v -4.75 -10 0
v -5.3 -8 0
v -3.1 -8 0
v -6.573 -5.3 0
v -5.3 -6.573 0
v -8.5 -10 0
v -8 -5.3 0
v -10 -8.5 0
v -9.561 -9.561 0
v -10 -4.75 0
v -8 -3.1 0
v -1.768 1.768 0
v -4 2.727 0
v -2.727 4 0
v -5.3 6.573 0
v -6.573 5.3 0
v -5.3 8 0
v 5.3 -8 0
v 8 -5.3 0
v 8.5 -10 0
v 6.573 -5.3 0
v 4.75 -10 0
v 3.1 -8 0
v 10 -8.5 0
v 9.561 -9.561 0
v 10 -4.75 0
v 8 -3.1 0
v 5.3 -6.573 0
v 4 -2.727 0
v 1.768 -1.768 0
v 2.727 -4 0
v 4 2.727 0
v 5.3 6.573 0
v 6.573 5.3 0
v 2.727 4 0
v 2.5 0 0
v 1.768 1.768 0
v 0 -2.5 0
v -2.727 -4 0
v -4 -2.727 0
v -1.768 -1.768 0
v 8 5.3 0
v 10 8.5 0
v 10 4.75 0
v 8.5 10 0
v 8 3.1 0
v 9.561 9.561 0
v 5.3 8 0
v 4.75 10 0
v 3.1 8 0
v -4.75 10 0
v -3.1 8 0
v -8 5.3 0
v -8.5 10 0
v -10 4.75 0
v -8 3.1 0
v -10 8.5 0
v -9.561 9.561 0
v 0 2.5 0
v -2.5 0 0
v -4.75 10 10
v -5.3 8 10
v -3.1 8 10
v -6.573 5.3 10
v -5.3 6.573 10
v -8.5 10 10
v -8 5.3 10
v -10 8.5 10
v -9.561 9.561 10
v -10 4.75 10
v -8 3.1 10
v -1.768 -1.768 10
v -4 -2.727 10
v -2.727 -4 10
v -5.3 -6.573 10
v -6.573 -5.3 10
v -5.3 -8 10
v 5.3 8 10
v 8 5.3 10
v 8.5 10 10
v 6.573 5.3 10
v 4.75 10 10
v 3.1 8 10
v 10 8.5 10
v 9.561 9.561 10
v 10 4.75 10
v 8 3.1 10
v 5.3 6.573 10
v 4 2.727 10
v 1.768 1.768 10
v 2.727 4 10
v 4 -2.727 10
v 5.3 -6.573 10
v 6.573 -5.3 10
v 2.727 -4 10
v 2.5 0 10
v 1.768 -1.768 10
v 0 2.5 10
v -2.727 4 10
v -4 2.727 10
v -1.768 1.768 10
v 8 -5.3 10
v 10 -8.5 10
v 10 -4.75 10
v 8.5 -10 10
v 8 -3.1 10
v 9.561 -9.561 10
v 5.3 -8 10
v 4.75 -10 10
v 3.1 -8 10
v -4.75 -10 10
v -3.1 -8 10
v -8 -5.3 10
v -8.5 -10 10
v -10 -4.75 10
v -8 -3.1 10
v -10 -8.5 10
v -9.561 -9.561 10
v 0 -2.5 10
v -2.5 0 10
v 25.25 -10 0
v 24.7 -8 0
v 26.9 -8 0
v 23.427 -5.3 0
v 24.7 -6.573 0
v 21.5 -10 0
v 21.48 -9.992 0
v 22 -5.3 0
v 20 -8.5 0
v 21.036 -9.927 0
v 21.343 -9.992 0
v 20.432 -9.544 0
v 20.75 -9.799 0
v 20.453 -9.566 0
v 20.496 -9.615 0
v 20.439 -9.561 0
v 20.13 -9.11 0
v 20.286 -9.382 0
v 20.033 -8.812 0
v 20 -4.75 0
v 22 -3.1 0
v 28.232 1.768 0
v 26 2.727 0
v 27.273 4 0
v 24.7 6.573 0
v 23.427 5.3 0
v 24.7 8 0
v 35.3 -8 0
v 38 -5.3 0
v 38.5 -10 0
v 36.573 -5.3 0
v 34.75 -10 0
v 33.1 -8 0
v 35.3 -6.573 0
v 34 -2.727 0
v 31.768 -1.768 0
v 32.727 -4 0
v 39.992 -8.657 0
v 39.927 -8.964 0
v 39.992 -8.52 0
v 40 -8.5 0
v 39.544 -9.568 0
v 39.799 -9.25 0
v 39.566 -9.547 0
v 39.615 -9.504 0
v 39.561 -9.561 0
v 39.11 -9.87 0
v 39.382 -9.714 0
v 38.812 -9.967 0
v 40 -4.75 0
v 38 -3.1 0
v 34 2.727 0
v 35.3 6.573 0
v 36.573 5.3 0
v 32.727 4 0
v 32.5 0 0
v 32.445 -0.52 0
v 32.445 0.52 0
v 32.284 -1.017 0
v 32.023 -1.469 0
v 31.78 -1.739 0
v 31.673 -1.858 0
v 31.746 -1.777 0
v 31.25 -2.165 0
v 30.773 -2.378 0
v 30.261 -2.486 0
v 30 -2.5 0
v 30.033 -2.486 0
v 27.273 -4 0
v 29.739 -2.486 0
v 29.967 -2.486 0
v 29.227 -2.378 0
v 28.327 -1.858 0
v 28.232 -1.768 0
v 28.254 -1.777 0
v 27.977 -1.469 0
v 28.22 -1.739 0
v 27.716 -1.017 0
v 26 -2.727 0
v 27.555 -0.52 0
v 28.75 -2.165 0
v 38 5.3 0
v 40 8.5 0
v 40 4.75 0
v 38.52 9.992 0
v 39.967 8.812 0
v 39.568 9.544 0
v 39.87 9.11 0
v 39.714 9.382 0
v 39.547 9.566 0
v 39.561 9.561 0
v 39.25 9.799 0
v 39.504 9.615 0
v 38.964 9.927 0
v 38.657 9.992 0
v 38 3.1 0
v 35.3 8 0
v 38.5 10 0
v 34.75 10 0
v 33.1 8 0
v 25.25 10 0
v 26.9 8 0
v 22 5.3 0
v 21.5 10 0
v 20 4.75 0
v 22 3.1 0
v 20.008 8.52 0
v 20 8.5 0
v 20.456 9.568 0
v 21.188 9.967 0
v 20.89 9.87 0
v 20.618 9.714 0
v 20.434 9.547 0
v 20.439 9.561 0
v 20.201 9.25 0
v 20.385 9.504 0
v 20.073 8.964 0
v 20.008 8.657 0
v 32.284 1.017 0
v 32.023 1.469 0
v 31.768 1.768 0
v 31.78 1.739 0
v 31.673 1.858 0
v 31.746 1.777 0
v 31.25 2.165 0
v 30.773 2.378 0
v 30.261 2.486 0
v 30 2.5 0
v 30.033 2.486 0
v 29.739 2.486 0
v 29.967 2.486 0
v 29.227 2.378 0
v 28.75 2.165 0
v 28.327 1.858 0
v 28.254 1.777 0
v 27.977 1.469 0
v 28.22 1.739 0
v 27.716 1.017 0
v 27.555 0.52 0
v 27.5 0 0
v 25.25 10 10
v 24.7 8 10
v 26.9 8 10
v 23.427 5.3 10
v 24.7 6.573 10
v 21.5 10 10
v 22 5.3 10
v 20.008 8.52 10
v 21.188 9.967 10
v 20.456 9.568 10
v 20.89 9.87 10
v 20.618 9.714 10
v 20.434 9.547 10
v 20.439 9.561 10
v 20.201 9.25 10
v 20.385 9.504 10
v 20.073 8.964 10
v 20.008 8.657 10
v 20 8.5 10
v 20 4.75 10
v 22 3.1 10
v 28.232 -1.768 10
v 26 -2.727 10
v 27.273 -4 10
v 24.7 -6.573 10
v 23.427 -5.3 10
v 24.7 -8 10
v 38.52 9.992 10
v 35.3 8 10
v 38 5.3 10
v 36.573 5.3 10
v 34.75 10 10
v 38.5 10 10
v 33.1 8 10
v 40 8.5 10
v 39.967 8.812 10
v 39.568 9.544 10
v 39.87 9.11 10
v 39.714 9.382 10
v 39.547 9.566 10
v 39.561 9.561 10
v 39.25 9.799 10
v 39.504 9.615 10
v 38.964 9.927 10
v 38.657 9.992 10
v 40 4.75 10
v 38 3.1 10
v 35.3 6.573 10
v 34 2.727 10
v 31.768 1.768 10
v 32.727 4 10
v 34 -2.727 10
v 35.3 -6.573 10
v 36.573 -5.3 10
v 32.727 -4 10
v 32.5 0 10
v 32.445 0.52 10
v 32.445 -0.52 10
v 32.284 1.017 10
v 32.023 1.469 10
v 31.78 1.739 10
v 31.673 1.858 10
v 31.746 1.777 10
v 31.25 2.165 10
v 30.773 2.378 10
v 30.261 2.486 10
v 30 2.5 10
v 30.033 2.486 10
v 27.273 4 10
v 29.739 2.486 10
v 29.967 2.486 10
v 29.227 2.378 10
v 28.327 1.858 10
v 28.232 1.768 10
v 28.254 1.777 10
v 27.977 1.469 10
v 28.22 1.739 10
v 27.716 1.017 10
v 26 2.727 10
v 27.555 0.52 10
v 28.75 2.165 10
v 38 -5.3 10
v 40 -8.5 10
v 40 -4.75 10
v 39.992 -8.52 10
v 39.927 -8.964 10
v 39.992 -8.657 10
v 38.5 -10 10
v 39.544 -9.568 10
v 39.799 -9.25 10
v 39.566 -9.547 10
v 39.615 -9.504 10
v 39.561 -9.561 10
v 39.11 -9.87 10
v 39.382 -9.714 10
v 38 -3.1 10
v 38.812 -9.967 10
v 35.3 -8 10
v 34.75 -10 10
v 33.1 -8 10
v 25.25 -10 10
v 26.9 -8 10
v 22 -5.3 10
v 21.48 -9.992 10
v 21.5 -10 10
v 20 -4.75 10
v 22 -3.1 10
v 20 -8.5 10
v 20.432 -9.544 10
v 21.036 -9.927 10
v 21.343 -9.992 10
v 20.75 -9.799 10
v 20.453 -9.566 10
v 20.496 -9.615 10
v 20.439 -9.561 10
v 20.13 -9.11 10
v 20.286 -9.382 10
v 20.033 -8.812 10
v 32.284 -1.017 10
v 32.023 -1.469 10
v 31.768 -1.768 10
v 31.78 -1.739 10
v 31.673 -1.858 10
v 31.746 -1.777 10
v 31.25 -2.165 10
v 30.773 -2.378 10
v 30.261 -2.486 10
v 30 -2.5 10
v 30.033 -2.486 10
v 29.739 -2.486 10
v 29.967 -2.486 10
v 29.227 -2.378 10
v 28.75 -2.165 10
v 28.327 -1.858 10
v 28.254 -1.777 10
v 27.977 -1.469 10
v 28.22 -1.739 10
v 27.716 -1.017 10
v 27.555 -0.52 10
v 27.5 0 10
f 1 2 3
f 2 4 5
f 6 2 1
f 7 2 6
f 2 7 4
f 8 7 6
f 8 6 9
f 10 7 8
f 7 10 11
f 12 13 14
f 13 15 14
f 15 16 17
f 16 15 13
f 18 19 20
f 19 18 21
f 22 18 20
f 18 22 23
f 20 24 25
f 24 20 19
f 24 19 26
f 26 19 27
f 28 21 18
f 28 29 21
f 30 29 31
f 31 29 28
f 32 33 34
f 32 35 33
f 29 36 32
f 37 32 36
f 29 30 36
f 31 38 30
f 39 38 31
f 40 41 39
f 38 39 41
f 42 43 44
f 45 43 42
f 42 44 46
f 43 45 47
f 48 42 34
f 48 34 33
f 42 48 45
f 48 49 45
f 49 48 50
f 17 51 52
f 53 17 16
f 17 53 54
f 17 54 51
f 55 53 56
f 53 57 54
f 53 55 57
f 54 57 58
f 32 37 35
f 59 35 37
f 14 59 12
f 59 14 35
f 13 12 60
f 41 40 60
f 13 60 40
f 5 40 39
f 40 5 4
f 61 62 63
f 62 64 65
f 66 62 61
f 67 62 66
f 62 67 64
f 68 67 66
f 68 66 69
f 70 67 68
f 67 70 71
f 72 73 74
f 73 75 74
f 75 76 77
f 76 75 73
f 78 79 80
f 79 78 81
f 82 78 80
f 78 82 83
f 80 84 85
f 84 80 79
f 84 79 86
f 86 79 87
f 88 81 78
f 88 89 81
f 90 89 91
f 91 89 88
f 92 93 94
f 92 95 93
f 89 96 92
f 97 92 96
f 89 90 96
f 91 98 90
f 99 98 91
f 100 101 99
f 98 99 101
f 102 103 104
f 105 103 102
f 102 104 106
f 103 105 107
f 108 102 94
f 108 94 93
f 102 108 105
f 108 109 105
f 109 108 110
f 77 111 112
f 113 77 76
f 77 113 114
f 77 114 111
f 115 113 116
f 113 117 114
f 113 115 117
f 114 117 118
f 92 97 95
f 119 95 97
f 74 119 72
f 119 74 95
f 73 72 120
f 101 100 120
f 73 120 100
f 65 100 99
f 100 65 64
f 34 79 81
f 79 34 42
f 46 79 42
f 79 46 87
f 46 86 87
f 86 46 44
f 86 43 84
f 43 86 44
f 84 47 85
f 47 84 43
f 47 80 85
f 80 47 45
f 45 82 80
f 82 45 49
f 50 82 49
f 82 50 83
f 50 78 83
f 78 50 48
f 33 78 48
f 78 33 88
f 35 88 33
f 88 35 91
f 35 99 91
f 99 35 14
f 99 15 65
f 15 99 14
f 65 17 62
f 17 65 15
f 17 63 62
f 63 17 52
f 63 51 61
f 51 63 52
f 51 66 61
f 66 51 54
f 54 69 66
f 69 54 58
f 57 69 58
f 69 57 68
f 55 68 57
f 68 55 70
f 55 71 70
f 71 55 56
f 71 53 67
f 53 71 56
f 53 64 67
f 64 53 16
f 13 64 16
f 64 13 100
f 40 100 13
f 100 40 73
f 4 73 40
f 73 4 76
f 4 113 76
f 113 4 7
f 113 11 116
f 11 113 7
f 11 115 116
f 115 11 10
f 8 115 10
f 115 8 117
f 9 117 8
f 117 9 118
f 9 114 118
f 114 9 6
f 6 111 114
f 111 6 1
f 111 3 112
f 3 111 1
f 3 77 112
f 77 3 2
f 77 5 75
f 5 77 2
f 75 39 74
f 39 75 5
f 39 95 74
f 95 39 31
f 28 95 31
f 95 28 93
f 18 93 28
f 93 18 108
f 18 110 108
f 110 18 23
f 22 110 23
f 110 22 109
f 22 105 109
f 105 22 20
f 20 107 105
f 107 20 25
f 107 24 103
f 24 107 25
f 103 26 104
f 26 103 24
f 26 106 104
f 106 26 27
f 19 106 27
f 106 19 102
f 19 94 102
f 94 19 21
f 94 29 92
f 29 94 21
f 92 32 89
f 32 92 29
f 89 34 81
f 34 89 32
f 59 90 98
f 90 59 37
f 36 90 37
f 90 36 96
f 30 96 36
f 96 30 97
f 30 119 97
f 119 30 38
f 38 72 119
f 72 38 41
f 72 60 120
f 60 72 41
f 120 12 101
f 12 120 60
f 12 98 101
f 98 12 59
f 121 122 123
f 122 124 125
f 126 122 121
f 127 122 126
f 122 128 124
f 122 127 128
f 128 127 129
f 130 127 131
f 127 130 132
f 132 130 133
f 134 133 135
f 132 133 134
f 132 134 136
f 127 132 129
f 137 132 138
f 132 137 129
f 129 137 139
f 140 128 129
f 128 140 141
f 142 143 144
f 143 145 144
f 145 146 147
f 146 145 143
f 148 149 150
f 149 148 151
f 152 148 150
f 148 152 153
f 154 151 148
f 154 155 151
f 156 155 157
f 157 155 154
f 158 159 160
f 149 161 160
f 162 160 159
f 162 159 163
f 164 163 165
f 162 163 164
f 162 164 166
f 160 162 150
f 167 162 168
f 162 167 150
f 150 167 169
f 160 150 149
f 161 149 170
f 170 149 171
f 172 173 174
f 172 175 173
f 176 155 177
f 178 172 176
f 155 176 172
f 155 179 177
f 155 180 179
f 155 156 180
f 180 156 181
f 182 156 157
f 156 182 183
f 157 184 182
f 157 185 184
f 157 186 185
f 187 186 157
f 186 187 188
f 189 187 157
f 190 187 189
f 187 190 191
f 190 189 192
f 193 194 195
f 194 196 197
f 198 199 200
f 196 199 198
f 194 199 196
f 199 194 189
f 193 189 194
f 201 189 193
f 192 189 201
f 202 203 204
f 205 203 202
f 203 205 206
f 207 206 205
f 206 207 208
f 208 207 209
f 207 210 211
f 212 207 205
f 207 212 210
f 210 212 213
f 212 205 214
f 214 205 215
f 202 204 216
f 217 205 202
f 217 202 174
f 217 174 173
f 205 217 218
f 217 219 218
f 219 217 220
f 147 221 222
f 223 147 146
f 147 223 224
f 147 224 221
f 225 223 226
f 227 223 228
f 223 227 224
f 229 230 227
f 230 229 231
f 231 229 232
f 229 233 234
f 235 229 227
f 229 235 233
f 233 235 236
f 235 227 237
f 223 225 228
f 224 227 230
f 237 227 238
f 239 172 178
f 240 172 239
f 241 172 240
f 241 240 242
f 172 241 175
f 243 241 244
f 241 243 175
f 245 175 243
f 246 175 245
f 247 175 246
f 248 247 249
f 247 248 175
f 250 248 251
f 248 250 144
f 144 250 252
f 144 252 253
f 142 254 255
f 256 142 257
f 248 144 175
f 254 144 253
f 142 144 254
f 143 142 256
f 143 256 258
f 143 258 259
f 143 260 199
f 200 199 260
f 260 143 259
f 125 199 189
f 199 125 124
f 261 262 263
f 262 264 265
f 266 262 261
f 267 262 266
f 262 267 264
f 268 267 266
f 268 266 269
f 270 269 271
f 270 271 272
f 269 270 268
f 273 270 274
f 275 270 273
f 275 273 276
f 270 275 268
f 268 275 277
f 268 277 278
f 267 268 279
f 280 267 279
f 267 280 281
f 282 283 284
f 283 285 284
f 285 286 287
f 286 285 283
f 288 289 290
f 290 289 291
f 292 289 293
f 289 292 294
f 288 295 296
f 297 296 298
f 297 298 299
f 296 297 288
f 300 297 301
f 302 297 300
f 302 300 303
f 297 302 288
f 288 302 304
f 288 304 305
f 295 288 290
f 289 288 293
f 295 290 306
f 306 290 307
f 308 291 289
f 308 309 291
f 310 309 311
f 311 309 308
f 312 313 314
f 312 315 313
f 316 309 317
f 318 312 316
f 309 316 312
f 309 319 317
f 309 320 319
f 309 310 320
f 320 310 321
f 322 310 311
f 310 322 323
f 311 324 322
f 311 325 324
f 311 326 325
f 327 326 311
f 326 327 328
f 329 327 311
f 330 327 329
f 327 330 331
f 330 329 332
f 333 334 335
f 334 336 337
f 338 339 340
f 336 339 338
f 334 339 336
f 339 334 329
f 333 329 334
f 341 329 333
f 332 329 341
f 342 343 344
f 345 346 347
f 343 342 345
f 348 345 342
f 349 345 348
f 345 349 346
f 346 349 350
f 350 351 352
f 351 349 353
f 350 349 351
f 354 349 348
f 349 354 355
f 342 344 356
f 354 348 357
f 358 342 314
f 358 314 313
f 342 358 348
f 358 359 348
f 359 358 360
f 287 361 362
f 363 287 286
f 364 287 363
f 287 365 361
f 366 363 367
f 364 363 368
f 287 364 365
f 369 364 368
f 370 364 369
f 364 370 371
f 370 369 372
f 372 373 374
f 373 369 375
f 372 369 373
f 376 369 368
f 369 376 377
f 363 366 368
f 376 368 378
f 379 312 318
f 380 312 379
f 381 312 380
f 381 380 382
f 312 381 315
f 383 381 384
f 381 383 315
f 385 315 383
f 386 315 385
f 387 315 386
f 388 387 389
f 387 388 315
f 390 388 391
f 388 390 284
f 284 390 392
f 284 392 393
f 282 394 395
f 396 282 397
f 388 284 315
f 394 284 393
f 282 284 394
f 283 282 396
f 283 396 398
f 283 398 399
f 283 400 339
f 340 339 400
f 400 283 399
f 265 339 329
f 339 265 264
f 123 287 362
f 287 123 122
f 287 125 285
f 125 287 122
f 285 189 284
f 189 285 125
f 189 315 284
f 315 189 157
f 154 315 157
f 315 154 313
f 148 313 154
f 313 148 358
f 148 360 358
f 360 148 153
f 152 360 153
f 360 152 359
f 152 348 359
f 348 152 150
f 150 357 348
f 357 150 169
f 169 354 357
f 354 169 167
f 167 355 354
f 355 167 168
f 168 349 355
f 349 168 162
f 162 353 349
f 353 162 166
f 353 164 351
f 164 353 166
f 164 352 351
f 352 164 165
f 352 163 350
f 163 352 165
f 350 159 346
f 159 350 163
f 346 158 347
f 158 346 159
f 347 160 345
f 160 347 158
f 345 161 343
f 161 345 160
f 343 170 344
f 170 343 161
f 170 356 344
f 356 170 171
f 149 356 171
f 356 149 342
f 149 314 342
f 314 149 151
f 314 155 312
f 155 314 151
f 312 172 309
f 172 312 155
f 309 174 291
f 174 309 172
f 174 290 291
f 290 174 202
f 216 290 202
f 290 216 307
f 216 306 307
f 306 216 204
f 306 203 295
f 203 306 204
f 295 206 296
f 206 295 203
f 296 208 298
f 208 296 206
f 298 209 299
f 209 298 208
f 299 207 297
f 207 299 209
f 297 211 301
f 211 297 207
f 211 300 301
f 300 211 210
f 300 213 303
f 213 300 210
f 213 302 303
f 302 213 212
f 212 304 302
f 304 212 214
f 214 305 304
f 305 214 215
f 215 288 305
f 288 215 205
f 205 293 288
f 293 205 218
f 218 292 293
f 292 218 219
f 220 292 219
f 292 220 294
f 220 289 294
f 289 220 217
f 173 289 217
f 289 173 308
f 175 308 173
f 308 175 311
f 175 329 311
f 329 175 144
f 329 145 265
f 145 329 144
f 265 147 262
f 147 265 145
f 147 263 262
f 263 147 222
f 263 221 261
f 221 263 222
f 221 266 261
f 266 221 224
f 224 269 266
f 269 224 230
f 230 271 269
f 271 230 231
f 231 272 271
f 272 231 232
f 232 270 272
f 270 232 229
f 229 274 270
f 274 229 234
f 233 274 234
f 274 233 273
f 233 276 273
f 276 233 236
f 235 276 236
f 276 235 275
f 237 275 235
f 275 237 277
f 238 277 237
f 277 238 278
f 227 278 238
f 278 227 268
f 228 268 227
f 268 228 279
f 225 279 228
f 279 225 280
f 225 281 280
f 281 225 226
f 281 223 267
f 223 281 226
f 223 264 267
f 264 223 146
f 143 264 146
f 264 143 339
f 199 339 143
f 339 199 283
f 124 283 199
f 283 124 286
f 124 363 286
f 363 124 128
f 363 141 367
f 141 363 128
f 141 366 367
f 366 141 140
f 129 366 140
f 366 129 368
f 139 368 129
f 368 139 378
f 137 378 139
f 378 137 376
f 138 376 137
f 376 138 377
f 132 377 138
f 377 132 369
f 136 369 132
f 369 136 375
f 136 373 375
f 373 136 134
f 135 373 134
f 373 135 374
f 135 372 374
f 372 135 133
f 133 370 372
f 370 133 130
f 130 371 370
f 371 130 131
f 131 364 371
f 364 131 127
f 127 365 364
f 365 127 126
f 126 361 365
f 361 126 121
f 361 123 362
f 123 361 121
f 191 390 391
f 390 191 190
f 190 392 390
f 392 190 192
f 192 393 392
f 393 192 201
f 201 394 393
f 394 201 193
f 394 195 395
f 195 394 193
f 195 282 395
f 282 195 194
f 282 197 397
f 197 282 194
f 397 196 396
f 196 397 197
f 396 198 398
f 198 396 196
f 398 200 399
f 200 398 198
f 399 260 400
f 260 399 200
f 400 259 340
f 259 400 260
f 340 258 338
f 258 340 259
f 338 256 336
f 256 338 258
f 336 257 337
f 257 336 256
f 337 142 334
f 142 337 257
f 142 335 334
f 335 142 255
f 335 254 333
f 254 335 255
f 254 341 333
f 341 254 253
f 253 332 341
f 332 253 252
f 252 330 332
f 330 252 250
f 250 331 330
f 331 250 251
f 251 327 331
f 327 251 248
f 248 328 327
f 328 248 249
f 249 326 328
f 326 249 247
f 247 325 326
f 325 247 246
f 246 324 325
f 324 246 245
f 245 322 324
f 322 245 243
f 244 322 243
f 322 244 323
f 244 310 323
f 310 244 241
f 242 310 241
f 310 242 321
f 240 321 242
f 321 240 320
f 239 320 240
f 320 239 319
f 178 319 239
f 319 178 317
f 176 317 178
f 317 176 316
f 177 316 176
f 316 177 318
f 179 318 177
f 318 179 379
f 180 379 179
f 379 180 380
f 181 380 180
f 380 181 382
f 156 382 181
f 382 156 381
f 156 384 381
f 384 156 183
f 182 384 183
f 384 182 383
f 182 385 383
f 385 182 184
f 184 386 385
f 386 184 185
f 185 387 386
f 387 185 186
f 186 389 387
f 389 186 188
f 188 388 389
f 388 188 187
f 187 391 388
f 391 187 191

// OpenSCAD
// Aleksandr Saechnikov 17 june 2015

extrusion_profile_20x20_v_slot(size=20, height=10);
translate([30,0,0]) extrusion_profile_20x20_v_slot_smooth(size=20, height=10);

$fn = 30;

module extrusion_profile_20x20_v_slot(size=20, height=10) {
	color([0.7,0.7,0.7]) linear_extrude(height=height) {
		union() {
			extrusion_profile_20x20_v_slot_part(size);
			rotate([0,0,90])  extrusion_profile_20x20_v_slot_part(size);
			rotate([0,0,180]) extrusion_profile_20x20_v_slot_part(size);
			rotate([0,0,270]) extrusion_profile_20x20_v_slot_part(size);
		}
	}
}

module extrusion_profile_20x20_v_slot_part(size=20) {
	d = 5;
	r = 1.5;
	s1 = 1.8;
	s2 = 2;
	s3 = 6;
	s4 = 6.2;
	s5 = 9.5;
	s6 = 10.6;
	s7 = 20;

	reSize = size/20; // Scalling

	k0 = 0;
	k1 = d*0.5*cos(45)*reSize;
	k2 = d*0.5*reSize;
	k3 = ( (s7*0.5-s3)-s1*0.5*sqrt(2) )*reSize;
	k4 = s4*0.5*reSize;
	k5 = ( s7*0.5-s3 )*reSize;
	k6 = s6*0.5*reSize;
	k7 = ( s6*0.5+s1*0.5*sqrt(2) )*reSize;
	k8 = ( s7*0.5-s2 )*reSize;
	k9 = s5*0.5*reSize;
	k10 = s7*0.5*reSize;
	k10_1 = k10-r*(1-cos(45))*reSize;
	k10_2 = k10-r*reSize;

	polygon(points=[
		[k1,k1],[k0,k2],[k0,k5],[k3,k5],
		[k6,k7],[k6,k8],[k4,k8],[k9,k10],
		[k10_2,k10],[k10_1,k10_1],
		[k10,k10_2],
		[k10,k9],[k8,k4],[k8,k6],[k7,k6],
		[k5,k3],[k5,k0],[k2,k0]
	]);
}

module extrusion_profile_20x20_v_slot_smooth(size=20, height=10) {
	linear_extrude(height=height) {
		difference() {
			union() {
				extrusion_profile_20x20_v_slot_part_smooth(size);
				rotate([0,0,90])  extrusion_profile_20x20_v_slot_part_smooth(size);
				rotate([0,0,180]) extrusion_profile_20x20_v_slot_part_smooth(size);
				rotate([0,0,270]) extrusion_profile_20x20_v_slot_part_smooth(size);
			}
			circle([0,0],r=size/20.*2.5);
		}
	}
}

module extrusion_profile_20x20_v_slot_part_smooth(size=20) {
	r_center = 0.5*size-1.5*size/20;
	union() {
		translate ([r_center,r_center]) circle(r=1.5*size/20);
		extrusion_profile_20x20_v_slot_part(size);
	}
}
